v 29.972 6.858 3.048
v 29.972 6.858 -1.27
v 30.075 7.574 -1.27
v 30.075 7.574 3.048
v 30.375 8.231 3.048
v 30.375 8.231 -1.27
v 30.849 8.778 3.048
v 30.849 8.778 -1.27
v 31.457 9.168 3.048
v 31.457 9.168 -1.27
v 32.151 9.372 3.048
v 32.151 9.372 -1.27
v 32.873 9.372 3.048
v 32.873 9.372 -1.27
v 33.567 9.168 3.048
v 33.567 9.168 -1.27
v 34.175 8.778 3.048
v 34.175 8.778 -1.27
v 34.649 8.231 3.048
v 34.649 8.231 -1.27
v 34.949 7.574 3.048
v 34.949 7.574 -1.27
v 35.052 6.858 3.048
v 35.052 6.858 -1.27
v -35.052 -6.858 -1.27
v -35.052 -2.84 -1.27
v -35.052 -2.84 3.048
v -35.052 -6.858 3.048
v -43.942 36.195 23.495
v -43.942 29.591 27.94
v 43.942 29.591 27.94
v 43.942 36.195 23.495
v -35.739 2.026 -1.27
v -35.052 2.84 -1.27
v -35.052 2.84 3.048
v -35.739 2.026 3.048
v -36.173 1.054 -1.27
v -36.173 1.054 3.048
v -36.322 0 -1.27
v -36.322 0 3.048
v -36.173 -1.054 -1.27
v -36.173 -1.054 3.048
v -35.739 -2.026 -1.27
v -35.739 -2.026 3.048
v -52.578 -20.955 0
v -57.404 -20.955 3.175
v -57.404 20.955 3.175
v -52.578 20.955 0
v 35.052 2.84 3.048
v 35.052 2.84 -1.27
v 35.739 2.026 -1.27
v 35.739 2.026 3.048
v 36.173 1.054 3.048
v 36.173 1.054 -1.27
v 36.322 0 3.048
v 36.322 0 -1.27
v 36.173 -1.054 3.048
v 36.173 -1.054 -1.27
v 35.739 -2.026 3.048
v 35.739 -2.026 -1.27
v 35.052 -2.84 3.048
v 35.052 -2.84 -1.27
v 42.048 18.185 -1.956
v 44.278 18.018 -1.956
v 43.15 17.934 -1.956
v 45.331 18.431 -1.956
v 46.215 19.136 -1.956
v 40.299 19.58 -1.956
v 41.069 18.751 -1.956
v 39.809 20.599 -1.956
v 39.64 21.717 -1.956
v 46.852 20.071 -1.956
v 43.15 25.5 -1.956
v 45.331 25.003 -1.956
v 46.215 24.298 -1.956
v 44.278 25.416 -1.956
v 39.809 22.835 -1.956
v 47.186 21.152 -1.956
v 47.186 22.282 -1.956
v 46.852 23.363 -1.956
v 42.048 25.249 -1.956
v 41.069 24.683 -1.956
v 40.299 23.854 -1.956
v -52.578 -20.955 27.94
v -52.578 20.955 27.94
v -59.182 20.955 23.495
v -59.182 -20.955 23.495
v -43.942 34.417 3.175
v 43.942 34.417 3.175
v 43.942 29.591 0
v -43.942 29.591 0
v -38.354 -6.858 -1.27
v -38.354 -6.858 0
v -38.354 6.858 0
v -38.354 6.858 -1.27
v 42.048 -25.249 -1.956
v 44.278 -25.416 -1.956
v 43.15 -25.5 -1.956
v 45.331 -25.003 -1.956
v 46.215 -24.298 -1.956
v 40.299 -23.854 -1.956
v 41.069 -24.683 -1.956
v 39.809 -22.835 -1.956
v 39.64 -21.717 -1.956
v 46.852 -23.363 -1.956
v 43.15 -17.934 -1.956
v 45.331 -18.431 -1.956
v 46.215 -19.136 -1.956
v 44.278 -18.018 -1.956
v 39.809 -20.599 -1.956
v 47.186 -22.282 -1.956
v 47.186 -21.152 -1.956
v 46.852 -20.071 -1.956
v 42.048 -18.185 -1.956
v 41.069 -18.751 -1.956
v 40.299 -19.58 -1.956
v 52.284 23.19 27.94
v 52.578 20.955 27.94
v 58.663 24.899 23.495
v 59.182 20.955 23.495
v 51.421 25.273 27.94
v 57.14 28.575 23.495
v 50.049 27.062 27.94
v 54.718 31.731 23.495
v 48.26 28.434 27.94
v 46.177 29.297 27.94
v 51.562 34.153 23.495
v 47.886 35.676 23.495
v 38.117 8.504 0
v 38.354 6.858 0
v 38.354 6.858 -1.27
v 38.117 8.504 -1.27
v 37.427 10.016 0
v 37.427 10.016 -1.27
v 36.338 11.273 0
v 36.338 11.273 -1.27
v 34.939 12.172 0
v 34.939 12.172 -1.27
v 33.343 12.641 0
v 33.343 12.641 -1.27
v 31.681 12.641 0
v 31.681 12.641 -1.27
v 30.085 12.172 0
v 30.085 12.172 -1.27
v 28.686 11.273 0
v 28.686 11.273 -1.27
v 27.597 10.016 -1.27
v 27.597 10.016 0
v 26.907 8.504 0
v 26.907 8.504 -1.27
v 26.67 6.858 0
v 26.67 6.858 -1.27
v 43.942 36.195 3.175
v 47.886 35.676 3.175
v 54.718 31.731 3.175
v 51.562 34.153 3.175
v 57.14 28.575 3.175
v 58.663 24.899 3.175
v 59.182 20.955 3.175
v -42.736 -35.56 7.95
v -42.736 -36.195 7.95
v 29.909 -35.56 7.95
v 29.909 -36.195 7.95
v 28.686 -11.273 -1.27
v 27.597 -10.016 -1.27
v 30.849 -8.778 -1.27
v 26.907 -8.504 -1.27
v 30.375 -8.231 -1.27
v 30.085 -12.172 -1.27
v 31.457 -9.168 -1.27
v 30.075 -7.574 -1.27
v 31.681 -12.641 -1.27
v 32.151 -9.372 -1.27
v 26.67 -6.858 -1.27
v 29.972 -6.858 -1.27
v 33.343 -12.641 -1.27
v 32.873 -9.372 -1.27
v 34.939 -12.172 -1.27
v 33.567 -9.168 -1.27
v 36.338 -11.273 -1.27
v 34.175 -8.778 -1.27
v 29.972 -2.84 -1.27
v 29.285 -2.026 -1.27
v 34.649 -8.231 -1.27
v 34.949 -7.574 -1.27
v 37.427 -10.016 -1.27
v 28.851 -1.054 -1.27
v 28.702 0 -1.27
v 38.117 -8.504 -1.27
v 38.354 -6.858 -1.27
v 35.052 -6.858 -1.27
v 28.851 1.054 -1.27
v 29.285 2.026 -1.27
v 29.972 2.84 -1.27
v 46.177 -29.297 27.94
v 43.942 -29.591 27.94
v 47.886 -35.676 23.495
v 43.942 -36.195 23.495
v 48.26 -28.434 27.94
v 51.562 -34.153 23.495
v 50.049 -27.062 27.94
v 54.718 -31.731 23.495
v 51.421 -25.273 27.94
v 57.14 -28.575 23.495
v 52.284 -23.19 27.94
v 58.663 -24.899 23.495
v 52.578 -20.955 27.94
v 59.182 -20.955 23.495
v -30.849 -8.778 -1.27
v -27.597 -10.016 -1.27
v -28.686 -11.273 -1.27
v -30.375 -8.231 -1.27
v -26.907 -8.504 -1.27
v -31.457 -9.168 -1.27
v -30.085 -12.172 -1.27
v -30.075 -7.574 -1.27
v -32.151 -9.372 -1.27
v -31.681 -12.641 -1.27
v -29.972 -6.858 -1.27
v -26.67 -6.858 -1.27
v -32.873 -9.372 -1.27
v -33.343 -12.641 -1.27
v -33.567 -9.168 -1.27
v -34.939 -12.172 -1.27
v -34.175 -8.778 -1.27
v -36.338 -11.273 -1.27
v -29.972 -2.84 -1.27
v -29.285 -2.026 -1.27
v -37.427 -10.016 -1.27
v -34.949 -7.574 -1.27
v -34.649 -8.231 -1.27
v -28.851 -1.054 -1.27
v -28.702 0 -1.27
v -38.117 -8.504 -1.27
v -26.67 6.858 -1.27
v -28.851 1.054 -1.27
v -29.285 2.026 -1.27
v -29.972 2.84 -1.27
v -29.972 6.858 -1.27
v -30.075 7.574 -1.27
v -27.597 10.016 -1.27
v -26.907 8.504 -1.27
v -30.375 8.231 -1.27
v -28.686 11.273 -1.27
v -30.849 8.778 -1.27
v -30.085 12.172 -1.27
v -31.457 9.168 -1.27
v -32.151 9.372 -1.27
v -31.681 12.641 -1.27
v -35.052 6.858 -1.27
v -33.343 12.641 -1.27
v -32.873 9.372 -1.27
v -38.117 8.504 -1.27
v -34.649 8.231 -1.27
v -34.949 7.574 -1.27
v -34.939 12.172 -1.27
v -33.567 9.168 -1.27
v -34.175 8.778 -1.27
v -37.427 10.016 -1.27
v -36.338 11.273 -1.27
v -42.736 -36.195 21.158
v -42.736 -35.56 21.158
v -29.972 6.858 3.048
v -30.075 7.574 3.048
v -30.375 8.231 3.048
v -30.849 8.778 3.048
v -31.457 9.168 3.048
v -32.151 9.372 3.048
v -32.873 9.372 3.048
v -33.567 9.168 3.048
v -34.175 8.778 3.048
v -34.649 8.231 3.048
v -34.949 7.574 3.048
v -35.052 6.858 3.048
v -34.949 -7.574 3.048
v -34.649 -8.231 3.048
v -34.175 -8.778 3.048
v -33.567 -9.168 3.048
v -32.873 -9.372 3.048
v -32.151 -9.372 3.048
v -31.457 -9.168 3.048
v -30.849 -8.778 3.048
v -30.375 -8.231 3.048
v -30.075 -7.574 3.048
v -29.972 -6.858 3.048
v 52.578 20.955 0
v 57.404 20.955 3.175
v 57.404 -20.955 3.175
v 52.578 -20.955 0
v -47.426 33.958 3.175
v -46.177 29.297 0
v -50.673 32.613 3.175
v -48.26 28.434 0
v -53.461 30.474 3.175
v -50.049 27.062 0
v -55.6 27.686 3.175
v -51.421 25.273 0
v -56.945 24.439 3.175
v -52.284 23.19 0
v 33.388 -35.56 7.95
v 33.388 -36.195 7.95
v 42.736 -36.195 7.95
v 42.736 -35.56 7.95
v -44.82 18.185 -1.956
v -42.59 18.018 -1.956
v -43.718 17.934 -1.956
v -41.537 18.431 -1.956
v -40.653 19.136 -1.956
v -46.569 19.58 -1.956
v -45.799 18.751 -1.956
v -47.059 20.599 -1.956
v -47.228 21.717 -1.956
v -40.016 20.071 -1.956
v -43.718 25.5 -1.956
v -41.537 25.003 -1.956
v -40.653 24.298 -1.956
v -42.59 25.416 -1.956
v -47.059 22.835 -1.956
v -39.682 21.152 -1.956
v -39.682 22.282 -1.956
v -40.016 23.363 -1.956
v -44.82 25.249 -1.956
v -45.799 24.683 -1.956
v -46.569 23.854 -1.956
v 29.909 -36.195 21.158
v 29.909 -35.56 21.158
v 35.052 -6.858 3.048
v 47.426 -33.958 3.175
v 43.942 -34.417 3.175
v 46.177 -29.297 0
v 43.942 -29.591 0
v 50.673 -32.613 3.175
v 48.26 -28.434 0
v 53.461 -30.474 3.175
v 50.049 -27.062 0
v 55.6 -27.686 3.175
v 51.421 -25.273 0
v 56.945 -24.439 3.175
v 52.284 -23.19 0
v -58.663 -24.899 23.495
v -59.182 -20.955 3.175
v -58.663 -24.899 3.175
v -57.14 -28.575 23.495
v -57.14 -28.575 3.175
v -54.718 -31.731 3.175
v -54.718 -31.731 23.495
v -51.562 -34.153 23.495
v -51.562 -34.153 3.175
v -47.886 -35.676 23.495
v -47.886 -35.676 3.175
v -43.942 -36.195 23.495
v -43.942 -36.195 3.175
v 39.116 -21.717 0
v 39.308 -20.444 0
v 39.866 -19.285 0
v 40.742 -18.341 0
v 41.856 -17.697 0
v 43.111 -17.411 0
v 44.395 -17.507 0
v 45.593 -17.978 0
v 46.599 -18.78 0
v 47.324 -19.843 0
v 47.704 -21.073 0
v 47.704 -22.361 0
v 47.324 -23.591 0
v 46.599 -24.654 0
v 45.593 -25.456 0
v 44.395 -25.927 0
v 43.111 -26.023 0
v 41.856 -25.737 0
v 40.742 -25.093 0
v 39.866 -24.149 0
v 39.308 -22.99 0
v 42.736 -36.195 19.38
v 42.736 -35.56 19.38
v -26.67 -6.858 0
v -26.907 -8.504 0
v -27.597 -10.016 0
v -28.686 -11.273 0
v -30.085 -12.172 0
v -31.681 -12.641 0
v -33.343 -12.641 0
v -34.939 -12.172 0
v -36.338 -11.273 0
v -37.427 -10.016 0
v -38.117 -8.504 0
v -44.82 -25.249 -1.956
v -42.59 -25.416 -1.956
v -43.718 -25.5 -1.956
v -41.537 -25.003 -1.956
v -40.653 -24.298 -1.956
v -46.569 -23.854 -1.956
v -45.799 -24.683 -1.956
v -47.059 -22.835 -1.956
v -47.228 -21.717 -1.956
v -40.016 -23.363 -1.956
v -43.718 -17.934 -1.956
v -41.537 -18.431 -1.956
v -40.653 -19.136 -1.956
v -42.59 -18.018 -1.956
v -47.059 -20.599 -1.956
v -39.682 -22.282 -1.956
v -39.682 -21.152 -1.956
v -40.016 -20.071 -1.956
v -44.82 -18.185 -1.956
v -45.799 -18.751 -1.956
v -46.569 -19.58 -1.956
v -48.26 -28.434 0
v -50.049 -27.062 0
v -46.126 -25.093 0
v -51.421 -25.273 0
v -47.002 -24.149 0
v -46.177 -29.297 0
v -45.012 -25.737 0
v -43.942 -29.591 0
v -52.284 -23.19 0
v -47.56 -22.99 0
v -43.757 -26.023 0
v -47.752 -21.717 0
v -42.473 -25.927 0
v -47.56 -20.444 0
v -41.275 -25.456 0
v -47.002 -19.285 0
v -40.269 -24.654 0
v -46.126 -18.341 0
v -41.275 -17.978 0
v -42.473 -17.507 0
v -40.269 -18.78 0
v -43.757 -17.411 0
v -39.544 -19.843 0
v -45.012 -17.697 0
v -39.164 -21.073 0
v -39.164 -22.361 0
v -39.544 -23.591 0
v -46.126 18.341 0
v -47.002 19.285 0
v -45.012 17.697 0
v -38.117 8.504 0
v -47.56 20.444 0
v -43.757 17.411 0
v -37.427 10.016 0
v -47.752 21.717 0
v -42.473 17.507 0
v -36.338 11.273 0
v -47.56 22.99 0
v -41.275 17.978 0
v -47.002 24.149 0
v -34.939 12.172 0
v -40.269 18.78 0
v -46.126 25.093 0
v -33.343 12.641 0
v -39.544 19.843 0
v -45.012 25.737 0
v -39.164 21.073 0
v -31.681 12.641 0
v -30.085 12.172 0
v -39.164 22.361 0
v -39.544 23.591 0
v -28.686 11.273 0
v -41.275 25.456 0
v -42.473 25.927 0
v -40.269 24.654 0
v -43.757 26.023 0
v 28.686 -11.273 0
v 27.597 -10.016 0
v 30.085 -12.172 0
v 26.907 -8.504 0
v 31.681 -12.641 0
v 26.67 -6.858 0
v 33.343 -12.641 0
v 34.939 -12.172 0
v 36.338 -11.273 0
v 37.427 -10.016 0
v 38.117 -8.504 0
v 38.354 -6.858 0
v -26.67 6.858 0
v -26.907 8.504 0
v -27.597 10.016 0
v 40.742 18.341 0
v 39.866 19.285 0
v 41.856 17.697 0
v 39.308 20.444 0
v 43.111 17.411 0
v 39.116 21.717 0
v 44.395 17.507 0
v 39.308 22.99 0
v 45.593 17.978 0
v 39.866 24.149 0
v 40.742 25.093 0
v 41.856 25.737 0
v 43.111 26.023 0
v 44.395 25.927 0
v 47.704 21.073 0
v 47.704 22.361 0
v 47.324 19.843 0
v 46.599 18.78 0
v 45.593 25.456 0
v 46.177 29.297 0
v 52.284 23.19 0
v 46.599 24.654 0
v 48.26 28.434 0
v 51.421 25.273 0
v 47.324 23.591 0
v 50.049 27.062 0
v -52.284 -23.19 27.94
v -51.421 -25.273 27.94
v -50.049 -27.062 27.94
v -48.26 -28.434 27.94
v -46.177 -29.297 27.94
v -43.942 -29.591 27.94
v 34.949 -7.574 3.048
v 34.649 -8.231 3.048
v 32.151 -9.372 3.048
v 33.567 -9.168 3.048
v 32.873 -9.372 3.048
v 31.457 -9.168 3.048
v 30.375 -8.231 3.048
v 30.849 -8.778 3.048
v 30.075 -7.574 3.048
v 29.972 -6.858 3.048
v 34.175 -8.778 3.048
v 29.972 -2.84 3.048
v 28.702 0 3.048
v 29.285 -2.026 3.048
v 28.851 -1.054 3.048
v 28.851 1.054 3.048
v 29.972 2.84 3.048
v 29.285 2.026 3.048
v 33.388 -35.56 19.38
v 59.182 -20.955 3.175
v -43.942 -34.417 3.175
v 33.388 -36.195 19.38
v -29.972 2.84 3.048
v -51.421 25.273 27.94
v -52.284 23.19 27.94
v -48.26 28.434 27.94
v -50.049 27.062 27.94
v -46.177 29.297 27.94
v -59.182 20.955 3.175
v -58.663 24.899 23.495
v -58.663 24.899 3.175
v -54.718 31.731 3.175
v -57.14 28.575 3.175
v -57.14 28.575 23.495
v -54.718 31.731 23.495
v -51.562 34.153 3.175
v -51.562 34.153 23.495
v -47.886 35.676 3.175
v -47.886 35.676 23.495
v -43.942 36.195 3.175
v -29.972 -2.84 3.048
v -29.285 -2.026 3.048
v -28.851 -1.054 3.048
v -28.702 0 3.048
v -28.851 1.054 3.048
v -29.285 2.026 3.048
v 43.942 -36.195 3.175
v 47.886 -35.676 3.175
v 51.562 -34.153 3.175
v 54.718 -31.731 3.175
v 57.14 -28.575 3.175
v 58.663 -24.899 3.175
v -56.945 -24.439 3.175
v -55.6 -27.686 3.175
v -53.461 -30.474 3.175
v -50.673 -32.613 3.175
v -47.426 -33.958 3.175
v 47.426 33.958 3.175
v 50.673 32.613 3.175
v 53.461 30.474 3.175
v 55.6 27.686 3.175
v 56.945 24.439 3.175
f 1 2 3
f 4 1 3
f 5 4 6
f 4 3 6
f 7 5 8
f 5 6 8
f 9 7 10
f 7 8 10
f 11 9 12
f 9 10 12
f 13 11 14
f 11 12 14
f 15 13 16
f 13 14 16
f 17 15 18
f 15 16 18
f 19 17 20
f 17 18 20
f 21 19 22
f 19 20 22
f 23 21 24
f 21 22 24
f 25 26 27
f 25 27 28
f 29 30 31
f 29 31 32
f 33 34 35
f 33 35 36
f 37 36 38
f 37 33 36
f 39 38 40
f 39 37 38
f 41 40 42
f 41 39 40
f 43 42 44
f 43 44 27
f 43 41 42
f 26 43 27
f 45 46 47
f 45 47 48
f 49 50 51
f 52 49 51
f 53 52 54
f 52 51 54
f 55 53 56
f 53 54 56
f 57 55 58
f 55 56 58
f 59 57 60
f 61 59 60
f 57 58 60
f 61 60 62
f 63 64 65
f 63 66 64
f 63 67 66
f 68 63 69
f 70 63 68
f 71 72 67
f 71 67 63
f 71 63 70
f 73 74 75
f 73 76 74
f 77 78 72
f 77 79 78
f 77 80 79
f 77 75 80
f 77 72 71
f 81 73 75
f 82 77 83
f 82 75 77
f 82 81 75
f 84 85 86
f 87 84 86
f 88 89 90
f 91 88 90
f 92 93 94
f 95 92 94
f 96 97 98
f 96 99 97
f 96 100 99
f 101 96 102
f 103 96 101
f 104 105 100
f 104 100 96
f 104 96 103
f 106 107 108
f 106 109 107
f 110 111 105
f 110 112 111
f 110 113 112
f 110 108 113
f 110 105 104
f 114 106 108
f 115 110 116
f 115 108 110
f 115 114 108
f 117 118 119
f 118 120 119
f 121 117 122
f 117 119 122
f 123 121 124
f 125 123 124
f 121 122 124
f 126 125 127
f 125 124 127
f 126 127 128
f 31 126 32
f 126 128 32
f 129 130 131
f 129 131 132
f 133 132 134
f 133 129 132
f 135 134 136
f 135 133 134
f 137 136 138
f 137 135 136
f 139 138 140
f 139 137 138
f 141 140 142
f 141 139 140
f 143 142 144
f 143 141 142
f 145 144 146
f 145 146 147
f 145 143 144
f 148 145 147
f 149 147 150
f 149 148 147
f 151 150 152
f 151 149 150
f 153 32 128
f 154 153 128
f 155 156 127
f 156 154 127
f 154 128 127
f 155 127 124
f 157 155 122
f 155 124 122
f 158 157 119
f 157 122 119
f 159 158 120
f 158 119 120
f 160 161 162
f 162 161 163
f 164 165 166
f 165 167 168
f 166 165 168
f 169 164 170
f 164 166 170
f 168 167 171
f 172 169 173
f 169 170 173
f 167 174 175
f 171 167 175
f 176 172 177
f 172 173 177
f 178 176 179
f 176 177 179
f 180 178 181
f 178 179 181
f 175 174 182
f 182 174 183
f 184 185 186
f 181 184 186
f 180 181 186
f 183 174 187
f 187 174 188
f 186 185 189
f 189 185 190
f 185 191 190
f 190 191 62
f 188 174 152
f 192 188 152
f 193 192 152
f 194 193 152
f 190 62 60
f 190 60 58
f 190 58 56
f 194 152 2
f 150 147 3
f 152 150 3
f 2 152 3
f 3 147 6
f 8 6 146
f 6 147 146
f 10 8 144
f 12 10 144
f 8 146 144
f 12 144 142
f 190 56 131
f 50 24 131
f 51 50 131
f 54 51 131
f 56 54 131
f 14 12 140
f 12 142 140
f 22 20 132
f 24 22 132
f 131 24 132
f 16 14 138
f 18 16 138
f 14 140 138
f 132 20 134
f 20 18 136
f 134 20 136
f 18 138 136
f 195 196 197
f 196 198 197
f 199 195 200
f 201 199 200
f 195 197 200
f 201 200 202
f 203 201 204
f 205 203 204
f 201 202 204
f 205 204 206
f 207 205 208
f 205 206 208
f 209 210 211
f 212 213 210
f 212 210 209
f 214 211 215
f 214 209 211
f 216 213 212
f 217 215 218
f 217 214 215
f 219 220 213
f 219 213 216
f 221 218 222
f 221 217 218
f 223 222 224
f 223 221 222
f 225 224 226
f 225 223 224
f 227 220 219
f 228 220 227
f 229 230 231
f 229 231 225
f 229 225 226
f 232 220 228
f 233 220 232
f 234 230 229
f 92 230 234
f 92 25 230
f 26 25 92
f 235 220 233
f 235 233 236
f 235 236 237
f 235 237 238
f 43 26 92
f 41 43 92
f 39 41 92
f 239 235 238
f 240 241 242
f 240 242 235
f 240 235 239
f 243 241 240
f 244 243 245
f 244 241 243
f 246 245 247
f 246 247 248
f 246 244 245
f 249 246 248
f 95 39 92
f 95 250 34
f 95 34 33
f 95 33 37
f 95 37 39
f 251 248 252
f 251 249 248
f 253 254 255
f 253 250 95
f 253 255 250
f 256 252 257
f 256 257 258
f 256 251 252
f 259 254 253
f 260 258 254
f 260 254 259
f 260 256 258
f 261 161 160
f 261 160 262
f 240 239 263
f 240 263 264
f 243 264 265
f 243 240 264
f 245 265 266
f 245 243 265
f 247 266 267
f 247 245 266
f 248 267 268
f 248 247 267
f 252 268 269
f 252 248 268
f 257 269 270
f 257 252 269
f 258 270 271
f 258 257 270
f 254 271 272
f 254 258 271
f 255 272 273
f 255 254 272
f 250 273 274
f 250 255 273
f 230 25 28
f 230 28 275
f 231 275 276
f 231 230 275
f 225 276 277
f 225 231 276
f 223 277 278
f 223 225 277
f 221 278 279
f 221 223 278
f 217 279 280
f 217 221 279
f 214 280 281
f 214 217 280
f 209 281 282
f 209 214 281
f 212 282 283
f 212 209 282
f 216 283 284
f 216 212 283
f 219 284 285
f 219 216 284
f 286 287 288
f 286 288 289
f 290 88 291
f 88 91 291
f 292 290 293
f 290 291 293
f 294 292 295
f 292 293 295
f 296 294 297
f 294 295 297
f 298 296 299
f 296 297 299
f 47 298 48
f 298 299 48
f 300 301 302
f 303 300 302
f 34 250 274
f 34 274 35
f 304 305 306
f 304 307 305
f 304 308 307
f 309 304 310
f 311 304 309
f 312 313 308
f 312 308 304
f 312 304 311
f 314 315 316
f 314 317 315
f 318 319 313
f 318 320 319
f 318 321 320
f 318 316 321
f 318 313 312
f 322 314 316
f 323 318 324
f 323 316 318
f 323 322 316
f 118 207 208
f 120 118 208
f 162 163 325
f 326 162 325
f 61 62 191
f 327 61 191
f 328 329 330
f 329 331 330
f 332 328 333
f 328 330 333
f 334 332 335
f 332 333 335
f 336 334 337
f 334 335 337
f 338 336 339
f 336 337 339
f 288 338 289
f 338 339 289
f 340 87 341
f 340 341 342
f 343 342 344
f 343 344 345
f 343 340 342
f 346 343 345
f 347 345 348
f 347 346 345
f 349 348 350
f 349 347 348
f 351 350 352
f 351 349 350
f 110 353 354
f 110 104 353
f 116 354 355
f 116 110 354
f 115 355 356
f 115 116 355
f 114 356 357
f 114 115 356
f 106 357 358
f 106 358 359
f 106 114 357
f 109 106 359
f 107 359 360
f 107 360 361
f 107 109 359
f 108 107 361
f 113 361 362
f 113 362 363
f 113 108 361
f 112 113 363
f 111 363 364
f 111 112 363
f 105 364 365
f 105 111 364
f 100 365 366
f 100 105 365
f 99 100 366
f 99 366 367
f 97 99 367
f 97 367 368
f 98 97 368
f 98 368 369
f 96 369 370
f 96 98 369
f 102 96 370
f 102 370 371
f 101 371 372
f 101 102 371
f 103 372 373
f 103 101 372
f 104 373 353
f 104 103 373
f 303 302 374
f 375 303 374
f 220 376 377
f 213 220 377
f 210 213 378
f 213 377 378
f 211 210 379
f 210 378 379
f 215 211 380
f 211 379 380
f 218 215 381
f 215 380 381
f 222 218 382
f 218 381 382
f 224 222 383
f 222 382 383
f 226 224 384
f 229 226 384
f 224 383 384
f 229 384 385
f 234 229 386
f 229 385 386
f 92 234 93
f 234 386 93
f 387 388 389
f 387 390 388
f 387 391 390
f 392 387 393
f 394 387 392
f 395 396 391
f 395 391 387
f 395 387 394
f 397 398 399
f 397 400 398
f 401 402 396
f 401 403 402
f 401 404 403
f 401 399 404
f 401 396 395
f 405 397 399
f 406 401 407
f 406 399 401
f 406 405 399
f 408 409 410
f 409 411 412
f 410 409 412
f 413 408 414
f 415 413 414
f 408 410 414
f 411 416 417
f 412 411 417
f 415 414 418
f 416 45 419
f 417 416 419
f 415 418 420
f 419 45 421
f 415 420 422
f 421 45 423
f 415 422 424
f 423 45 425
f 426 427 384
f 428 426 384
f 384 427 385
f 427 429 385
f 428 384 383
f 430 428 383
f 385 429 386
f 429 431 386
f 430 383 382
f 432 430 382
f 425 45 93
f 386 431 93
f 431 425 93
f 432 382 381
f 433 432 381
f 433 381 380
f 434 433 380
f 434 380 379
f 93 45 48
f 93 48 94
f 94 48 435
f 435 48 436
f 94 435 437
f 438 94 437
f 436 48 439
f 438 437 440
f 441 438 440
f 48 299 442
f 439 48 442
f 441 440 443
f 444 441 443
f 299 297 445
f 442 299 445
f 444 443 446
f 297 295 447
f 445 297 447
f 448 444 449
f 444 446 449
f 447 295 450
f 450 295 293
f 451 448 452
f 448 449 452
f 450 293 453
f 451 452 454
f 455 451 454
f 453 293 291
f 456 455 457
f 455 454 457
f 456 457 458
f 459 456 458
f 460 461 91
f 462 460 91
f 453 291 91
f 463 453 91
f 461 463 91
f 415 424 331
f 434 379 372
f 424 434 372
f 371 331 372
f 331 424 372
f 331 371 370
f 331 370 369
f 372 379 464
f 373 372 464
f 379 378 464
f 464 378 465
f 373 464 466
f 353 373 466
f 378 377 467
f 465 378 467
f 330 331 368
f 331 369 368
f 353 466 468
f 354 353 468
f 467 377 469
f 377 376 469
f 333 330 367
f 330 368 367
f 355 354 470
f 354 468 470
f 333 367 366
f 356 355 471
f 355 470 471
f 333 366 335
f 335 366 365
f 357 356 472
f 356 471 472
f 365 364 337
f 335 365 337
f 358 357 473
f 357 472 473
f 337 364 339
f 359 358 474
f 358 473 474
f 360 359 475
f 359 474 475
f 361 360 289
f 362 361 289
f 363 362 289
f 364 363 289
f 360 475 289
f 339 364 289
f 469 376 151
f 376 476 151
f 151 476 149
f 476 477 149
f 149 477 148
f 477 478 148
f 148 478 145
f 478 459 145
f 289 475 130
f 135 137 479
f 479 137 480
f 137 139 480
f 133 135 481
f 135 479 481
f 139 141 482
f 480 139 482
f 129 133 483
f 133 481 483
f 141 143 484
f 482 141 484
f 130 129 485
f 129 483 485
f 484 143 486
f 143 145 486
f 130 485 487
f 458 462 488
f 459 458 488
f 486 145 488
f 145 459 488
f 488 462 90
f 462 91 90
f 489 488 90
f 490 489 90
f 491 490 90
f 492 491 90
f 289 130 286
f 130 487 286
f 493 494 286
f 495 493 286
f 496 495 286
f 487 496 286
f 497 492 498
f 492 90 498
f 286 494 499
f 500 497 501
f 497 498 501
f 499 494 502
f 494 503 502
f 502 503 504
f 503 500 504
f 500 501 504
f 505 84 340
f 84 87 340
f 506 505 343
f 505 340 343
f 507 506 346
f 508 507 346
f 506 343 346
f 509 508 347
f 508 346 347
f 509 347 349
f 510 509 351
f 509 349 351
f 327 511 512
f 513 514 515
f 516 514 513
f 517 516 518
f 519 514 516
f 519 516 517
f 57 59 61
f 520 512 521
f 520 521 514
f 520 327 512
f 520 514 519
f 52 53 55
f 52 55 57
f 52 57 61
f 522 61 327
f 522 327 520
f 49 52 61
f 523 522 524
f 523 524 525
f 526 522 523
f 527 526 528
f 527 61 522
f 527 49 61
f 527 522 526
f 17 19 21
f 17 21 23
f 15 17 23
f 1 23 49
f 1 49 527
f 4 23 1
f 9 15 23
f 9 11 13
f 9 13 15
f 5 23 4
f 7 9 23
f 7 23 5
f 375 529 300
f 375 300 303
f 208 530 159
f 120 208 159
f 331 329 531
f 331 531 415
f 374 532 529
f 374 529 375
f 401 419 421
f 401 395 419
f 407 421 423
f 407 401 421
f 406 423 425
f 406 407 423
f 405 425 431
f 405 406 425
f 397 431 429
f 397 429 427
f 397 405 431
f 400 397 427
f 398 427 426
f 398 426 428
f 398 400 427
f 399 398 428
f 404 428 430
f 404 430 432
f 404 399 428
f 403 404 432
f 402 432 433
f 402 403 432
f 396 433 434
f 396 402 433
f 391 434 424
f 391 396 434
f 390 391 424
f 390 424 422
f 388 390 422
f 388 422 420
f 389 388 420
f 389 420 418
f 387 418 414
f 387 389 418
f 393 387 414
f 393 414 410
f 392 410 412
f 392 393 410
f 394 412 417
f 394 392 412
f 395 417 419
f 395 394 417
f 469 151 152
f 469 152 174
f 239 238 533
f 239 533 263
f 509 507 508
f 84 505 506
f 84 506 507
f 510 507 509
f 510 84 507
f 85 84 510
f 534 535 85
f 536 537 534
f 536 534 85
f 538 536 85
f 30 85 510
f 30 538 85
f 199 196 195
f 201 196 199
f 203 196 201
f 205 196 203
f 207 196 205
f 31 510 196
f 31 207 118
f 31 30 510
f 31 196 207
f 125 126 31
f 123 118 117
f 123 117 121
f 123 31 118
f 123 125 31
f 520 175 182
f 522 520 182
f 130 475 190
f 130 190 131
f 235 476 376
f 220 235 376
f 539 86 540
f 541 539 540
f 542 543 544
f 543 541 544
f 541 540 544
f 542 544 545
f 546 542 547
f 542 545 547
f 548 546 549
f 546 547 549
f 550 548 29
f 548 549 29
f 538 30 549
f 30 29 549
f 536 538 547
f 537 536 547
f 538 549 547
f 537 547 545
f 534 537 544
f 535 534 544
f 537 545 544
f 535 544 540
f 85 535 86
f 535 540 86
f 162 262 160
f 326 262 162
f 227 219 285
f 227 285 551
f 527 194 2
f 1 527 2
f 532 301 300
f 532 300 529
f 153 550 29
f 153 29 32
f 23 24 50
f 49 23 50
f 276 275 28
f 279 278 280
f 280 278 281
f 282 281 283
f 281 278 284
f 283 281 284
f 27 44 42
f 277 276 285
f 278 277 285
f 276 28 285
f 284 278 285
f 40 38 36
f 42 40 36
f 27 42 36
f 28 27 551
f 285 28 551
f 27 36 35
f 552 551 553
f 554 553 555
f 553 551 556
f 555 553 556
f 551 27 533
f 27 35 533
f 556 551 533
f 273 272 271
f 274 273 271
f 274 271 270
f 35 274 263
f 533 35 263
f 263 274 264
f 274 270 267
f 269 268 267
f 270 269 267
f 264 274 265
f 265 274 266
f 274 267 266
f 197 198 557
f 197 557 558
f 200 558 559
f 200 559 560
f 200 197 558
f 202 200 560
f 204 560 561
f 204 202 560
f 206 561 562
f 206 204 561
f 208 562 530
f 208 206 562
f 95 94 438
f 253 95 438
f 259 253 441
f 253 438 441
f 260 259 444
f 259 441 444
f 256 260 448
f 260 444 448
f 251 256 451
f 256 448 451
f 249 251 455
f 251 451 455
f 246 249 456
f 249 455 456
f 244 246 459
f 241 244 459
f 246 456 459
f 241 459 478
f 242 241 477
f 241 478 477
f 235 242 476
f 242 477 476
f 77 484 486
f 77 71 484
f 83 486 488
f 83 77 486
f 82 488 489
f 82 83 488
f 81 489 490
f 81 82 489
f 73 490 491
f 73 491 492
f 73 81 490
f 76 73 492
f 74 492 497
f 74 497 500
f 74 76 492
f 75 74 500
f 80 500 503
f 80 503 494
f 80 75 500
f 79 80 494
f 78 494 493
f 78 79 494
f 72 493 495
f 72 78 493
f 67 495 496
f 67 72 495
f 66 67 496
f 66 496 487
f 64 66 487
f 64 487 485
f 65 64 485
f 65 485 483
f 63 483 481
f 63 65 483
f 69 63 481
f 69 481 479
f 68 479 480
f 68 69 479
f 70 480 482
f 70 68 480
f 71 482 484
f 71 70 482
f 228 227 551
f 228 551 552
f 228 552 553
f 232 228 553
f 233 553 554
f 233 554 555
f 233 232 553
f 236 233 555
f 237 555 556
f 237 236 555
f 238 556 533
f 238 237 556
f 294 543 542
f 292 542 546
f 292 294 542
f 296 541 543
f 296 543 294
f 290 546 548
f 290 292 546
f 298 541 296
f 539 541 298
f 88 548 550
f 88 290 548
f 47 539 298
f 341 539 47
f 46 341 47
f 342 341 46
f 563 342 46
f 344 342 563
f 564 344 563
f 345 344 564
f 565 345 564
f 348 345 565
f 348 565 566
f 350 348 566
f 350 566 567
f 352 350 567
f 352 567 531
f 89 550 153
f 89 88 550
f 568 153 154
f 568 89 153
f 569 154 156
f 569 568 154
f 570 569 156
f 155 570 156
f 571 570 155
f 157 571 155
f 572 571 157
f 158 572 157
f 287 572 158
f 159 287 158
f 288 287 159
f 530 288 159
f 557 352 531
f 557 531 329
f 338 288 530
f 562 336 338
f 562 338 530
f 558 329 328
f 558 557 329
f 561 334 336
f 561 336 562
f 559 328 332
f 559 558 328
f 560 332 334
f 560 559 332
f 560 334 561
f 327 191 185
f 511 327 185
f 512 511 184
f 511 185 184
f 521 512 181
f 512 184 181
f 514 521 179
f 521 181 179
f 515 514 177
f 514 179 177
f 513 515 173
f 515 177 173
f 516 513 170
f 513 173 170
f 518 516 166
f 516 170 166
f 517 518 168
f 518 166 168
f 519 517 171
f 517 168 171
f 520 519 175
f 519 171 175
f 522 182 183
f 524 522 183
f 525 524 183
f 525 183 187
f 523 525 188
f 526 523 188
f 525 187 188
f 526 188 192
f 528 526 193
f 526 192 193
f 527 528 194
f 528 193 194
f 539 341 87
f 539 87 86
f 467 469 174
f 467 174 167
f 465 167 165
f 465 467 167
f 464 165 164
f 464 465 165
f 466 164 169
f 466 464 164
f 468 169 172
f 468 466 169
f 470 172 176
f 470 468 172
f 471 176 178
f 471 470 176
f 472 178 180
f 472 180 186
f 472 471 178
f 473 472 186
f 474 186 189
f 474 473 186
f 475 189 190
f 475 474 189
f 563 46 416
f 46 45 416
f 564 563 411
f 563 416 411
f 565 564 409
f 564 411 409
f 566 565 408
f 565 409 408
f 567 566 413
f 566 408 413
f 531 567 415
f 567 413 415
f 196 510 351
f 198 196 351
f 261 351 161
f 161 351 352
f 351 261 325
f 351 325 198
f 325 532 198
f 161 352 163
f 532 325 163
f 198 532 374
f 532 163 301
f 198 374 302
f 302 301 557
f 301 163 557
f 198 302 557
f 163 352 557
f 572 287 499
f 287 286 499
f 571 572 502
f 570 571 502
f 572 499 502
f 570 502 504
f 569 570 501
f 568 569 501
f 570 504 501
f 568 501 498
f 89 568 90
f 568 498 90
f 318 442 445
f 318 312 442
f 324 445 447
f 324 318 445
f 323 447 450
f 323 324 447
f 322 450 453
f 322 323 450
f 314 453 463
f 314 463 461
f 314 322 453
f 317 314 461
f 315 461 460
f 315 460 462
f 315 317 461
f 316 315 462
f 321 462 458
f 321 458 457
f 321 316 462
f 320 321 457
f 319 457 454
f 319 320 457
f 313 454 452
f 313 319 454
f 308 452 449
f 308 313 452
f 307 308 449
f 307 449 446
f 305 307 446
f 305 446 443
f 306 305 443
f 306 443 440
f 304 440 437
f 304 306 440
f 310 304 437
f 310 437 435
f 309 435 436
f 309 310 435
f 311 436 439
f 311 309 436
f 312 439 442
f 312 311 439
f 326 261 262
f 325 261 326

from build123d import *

# Parameters (mm, degrees)
SKETCH1_W           = 118.364
SKETCH1_H           = 72.39
BOSS_EXTRUDE1_DEPTH = 27.94
SKETCH2_R           = 4.318
BOSS_EXTRUDE2_DEPTH = 1.9558
BOSS_EXTRUDE2_TAPER = 15
FILLET1_R           = 15.24
BOSS_EXTRUDE3_DEPTH = 1.27
CUT_EXTRUDE1_DEPTH  = 4.318
SKETCH13_W          = 72.644
SKETCH13_H          = 13.208
SKETCH13_W_2        = 9.3472
SKETCH13_H_2        = 11.43
CUT_EXTRUDE2_DEPTH  = 0.635


with BuildPart() as part:
    # Sketch1 → Boss-Extrude1 (new body)
    with BuildSketch(Plane.XY):
        Rectangle(SKETCH1_W, SKETCH1_H)
    extrude(amount=BOSS_EXTRUDE1_DEPTH)

    # Sketch2 → Boss-Extrude2 (add)
    with BuildSketch(Plane(origin=(0, 0, 0), x_dir=(-1, 0, 0), z_dir=(0, 0, -1))):
        with Locations((-43.434, 21.717)):
            Circle(SKETCH2_R)
        with Locations((-43.434, -21.717)):
            Circle(SKETCH2_R)
        with Locations((43.434, -21.717)):
            Circle(SKETCH2_R)
        with Locations((43.434, 21.717)):
            Circle(SKETCH2_R)
    extrude(amount=BOSS_EXTRUDE2_DEPTH, taper=BOSS_EXTRUDE2_TAPER)

    # Fillet1
    fillet1_edges = [part.edges().sort_by_distance(p)[0] for p in [
        (-59.182, 36.195, 13.97),
        (59.182, 36.195, 13.97),
        (59.182, -36.195, 13.97),
        (-59.182, -36.195, 13.97),
    ]]
    fillet(fillet1_edges, radius=FILLET1_R)

    # Cut-Sweep1: sweep along a path in Sketch4
    with BuildLine(Plane.XY.offset(27.94)) as cut_sweep1_path:
        Line((43.942, 36.195), (-43.942, 36.195))
        ThreePointArc((-43.942, 36.195), (-54.718307345, 31.731307345), (-59.182, 20.955))
        Line((-59.182, 20.955), (-59.182, -20.955))
        ThreePointArc((-59.182, -20.955), (-54.718307345, -31.731307345), (-43.942, -36.195))
        Line((-43.942, -36.195), (43.942, -36.195))
        ThreePointArc((43.942, -36.195), (54.718307345, -31.731307345), (59.182, -20.955))
        Line((59.182, -20.955), (59.182, 20.955))
        ThreePointArc((59.182, 20.955), (54.718307345, 31.731307345), (43.942, 36.195))
    # Sketch3 → Cut-Sweep1 (sweep, cut)
    with BuildSketch(Plane(origin=(0, 0, 0), x_dir=(0, 0, -1), z_dir=(1, 0, 0))):
        Polygon((-23.495, 36.195), (-27.94, 29.591), (-27.94, 36.195), align=None)
        Polygon((0, 36.195), (0, 29.591), (-3.175, 34.417), (-3.175, 36.195), align=None)
    sweep(path=cut_sweep1_path.line, mode=Mode.SUBTRACT)

    # Sketch11 → Boss-Extrude3 (add)
    with BuildSketch(Plane(origin=(0, 0, 0), x_dir=(-1, 0, 0), z_dir=(0, 0, -1))):
        with BuildLine():
            Line((-26.67, 6.858), (-26.67, -6.858))
            ThreePointArc((-26.67, -6.858), (-32.512, -12.7), (-38.354, -6.858))
            Line((-38.354, -6.858), (-38.354, 6.858))
            ThreePointArc((-38.354, 6.858), (-32.512, 12.7), (-26.67, 6.858))
        make_face()
        with BuildLine():
            Line((26.67, 6.858), (26.67, -6.858))
            ThreePointArc((26.67, -6.858), (32.512, -12.7), (38.354, -6.858))
            Line((38.354, -6.858), (38.354, 6.858))
            ThreePointArc((38.354, 6.858), (32.512, 12.7), (26.67, 6.858))
        make_face()
    extrude(amount=BOSS_EXTRUDE3_DEPTH)

    # Sketch12 → Cut-Extrude1 (cut)
    with BuildSketch(Plane(origin=(0, 0, -1.27), x_dir=(-1, 0, 0), z_dir=(0, 0, -1))):
        with BuildLine():
            Line((-35.052, 6.858), (-35.052, 2.839806331))
            ThreePointArc((-35.052, 2.839806331), (-36.322, 0), (-35.052, -2.839806331))
            Line((-35.052, -2.839806331), (-35.052, -6.858))
            ThreePointArc((-35.052, -6.858), (-32.512, -9.398), (-29.972, -6.858))
            Line((-29.972, -6.858), (-29.972, -2.839806331))
            ThreePointArc((-29.972, -2.839806331), (-28.702, 0), (-29.972, 2.839806331))
            Line((-29.972, 2.839806331), (-29.972, 6.858))
            ThreePointArc((-29.972, 6.858), (-32.512, 9.398), (-35.052, 6.858))
        make_face()
        with BuildLine():
            Line((29.972, 2.839806331), (29.972, 6.858))
            ThreePointArc((29.972, 6.858), (32.512, 9.398), (35.052, 6.858))
            Line((35.052, 6.858), (35.052, 2.839806331))
            ThreePointArc((35.052, 2.839806331), (36.322, 0), (35.052, -2.839806331))
            Line((35.052, -2.839806331), (35.052, -6.858))
            ThreePointArc((35.052, -6.858), (32.512, -9.398), (29.972, -6.858))
            Line((29.972, -6.858), (29.972, -2.839806331))
            ThreePointArc((29.972, -2.839806331), (28.702, 0), (29.972, 2.839806331))
        make_face()
    extrude(amount=-CUT_EXTRUDE1_DEPTH, mode=Mode.SUBTRACT)

    # Sketch13 → Cut-Extrude2 (cut)
    with BuildSketch(Plane.XZ.offset(36.195)):
        with Locations((-6.4135, 14.5542)):
            Rectangle(SKETCH13_W, SKETCH13_H)
        with Locations((38.0619, 13.6652)):
            Rectangle(SKETCH13_W_2, SKETCH13_H_2)
    extrude(amount=-CUT_EXTRUDE2_DEPTH, mode=Mode.SUBTRACT)


solid = part.part
